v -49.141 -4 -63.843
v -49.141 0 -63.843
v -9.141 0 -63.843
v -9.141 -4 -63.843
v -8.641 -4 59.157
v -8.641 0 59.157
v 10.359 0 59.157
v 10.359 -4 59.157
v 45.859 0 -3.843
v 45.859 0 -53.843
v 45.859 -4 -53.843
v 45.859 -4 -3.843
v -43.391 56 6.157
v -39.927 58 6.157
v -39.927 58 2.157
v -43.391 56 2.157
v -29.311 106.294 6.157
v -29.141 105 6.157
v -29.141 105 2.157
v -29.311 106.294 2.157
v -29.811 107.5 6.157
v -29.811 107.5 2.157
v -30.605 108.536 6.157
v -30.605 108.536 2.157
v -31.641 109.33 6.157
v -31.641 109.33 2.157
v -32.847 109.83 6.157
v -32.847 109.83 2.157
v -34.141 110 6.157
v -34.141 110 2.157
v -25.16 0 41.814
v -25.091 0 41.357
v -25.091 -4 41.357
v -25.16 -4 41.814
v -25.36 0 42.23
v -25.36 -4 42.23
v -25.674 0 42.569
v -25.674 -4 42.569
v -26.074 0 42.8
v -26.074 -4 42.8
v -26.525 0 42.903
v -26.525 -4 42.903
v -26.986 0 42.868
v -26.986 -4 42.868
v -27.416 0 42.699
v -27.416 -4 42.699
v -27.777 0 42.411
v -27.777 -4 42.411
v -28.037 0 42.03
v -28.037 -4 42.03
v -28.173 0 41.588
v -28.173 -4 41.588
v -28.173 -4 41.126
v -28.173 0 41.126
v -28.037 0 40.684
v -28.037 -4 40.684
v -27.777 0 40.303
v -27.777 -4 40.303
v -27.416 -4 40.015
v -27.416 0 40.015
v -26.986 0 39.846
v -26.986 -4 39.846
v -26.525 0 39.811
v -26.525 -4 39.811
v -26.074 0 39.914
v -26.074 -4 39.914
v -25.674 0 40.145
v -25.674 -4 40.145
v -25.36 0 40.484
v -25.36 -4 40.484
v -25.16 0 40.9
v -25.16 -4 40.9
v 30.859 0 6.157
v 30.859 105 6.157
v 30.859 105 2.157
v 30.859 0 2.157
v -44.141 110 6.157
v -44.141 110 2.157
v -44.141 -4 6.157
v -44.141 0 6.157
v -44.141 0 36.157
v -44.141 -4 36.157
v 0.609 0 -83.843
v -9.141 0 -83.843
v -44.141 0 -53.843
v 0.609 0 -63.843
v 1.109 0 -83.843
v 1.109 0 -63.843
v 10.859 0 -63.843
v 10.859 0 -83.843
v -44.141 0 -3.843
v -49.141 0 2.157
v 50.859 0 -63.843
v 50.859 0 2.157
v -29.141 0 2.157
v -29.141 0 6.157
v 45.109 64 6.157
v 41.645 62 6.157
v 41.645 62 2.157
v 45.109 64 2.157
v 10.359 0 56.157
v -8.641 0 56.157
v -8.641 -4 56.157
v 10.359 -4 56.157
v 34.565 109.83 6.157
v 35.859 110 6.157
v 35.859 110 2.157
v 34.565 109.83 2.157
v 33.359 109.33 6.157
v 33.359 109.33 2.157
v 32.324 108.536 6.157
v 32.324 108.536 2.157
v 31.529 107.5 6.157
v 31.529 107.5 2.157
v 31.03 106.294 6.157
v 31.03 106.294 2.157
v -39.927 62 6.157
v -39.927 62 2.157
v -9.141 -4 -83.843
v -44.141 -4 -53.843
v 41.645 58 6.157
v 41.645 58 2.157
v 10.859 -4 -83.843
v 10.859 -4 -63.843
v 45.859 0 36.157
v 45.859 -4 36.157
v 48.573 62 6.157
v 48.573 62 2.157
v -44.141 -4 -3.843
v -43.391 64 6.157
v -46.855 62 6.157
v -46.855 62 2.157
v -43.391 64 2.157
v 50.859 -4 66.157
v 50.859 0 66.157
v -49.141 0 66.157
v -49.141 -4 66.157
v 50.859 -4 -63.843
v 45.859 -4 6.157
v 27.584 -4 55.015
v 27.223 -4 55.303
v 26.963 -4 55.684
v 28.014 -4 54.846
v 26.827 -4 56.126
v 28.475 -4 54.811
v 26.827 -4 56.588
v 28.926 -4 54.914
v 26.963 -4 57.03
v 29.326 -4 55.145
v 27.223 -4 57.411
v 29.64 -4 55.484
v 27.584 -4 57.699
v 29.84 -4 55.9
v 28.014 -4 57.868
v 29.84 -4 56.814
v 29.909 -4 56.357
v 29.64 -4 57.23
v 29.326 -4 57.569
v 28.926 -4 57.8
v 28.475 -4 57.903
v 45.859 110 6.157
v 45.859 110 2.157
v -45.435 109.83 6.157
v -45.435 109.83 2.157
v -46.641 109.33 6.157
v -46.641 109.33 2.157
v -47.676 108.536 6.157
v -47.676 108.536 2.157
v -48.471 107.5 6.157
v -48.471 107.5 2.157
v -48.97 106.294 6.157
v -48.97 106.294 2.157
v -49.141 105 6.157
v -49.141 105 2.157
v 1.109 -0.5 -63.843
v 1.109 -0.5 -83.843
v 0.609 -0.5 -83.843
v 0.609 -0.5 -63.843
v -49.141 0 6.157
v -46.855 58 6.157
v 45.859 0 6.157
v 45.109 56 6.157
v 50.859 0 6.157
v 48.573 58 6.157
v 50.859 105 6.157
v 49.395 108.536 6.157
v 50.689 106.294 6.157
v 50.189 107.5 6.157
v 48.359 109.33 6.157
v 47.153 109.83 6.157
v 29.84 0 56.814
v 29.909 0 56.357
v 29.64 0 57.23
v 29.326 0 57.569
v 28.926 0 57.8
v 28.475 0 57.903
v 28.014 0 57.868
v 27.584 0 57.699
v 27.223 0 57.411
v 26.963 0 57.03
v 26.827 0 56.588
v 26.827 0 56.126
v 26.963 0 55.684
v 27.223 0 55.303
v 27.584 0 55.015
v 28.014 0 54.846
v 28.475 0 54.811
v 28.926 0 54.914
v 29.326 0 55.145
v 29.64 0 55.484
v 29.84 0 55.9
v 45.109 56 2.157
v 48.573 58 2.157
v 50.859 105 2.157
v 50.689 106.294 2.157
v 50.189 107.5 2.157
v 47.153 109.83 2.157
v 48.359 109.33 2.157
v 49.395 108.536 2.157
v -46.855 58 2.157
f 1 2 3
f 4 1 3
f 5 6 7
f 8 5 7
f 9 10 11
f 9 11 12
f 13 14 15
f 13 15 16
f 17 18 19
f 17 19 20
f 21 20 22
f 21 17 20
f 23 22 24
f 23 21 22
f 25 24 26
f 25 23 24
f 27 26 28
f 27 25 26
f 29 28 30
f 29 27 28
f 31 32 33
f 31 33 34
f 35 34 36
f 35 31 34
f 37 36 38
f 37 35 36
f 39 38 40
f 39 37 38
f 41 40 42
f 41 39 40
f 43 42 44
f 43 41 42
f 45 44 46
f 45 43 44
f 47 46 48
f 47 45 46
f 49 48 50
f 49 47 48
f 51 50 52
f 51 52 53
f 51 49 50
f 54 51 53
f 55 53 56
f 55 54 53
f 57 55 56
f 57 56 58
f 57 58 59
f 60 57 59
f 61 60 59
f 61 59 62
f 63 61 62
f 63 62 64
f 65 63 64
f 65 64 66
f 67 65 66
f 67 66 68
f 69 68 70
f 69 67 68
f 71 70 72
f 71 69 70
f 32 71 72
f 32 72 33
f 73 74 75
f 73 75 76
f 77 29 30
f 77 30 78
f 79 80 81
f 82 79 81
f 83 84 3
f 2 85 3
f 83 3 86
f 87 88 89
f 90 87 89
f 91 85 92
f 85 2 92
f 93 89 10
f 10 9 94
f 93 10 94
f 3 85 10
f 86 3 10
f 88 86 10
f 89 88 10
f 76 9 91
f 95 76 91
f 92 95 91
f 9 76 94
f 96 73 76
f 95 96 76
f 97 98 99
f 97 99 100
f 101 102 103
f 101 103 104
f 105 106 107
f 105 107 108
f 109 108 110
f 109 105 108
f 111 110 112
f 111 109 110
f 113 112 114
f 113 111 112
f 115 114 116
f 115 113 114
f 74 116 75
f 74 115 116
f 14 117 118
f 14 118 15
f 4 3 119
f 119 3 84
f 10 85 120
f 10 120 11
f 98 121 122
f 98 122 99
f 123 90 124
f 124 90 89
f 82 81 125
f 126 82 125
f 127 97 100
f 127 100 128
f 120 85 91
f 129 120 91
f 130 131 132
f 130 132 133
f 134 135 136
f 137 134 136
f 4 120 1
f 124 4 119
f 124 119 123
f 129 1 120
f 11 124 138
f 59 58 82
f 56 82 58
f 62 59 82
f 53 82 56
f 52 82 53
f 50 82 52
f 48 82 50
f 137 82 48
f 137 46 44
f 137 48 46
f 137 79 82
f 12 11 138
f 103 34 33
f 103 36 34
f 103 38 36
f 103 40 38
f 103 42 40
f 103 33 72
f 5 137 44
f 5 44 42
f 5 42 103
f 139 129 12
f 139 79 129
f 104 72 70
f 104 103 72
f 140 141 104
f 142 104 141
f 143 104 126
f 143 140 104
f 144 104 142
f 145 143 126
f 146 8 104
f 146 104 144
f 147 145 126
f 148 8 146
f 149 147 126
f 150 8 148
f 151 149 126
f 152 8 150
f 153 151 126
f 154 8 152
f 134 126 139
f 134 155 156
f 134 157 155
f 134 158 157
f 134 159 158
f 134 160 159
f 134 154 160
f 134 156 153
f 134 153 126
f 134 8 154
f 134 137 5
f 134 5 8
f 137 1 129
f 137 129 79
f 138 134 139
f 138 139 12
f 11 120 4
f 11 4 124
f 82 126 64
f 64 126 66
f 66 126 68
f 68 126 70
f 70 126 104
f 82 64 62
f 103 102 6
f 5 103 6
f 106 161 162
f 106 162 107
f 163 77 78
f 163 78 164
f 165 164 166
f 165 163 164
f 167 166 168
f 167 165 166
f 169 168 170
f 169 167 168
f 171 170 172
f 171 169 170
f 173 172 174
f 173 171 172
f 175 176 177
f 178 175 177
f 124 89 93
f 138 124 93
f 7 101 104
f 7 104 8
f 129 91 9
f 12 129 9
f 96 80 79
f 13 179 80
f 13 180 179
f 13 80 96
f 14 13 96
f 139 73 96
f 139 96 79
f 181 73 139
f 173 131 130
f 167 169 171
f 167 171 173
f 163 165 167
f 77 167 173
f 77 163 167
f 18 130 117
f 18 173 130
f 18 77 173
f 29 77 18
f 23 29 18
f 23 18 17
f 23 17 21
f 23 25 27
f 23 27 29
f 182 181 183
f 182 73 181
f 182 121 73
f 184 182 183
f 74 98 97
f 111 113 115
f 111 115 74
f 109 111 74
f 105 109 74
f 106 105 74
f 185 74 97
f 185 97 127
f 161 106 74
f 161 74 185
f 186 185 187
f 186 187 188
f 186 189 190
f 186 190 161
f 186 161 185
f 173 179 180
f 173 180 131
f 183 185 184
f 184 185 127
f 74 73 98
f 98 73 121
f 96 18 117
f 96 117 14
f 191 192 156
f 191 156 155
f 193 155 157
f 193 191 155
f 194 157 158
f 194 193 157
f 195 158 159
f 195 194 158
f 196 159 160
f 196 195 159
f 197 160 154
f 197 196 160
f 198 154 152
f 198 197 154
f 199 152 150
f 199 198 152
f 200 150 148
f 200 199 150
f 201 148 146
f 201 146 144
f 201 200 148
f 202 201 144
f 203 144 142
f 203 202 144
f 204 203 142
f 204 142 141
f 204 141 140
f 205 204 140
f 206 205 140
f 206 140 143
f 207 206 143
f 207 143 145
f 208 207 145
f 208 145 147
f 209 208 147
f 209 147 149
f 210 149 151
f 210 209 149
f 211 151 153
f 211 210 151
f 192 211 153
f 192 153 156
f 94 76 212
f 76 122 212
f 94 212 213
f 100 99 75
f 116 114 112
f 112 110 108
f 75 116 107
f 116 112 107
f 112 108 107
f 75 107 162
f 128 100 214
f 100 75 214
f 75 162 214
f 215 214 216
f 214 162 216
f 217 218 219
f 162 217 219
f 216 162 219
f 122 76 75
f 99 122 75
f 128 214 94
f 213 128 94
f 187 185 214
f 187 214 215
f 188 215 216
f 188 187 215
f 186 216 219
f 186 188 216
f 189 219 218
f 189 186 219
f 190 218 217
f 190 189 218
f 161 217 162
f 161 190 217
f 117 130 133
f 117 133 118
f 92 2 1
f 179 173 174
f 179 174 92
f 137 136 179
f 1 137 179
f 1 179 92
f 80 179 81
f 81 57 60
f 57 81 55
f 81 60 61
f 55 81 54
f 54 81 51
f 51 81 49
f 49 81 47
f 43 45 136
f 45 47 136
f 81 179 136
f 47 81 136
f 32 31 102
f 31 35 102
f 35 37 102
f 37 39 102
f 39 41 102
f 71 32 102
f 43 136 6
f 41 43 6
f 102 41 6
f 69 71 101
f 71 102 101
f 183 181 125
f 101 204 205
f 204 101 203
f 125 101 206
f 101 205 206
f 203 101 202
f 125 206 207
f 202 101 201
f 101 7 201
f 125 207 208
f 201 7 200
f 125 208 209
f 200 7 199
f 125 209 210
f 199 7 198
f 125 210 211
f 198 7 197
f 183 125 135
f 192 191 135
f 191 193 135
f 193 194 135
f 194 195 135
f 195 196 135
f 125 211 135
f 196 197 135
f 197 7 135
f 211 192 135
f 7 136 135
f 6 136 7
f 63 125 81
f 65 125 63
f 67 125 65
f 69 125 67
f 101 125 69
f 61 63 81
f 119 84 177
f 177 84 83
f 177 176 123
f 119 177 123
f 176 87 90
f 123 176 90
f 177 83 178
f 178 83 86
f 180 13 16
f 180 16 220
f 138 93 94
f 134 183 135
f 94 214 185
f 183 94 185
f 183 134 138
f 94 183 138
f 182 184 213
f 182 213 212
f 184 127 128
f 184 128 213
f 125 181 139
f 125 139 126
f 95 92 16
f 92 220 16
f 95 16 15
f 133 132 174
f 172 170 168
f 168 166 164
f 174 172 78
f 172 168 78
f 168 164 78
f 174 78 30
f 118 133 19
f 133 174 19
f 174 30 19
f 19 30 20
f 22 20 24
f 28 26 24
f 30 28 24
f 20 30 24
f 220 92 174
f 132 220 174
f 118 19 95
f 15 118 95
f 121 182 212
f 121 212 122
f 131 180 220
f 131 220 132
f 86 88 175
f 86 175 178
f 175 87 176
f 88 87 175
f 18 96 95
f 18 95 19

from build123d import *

# Parameters (mm, degrees)
F0_W     = 90
F0_H     = 50
F0_H_2   = 30
F0_R     = 1.55
F0_W_2   = 19
F0_H_3   = 3
F1_DEPTH = 4
F3_DEPTH = 4
F4_W     = 0.5
F4_H     = 20
F5_DEPTH = 0.5


with BuildPart() as f1:
    # F0 (on Front) → F1 (new body)
    with BuildSketch(Plane.XZ):
        Polygon((50.859297, 66.157015), (-49.140703, 66.157015), (-49.140703, -63.842985), (-9.140703, -63.842985), (-9.140703, -83.842985), (10.859297, -83.842985), (10.859297, -63.842985), (50.859297, -63.842985), align=None)
        with Locations((0.859297, -28.842985)):
            Rectangle(F0_W, F0_H, mode=Mode.SUBTRACT)
        with Locations((0.859297, 21.157015)):
            Rectangle(F0_W, F0_H_2, mode=Mode.SUBTRACT)
        with Locations((-26.640703, 41.357015)):
            Circle(F0_R, mode=Mode.SUBTRACT)
        with Locations((0.859297, 57.657015)):
            Rectangle(F0_W_2, F0_H_3, mode=Mode.SUBTRACT)
        with Locations((28.359297, 56.357015)):
            Circle(F0_R, mode=Mode.SUBTRACT)
    extrude(amount=F1_DEPTH)

    # F2 (on face) → F3 (join)
    with BuildSketch(Plane.XY.offset(6.157015)):
        with BuildLine():
            Line((-49.140703, 105), (-49.140703, 0))
            Line((-49.140703, 0), (-29.140703, 0))
            Line((-29.140703, 0), (-29.140703, 105))
            ThreePointArc((-29.140703, 105), (-30.605169, 108.535534), (-34.140703, 110))
            Line((-34.140703, 110), (-44.140703, 110))
            ThreePointArc((-44.140703, 110), (-47.676237, 108.535534), (-49.140703, 105))
        make_face()
        Polygon((-46.854805, 62), (-43.390703, 64), (-39.926602, 62), (-39.926602, 58), (-43.390703, 56), (-46.854805, 58), align=None, mode=Mode.SUBTRACT)
        with BuildLine():
            Line((30.859297, 105), (30.859297, 0))
            Line((30.859297, 0), (50.859297, 0))
            Line((50.859297, 0), (50.859297, 105))
            ThreePointArc((50.859297, 105), (49.394831, 108.535534), (45.859297, 110))
            Line((45.859297, 110), (35.859297, 110))
            ThreePointArc((35.859297, 110), (32.323763, 108.535534), (30.859297, 105))
        make_face()
        Polygon((45.109297, 64), (48.573398, 62), (48.573398, 58), (45.109297, 56), (41.645195, 58), (41.645195, 62), align=None, mode=Mode.SUBTRACT)
    extrude(amount=-F3_DEPTH)

    # F4 (on face) → F5 (cut)
    with BuildSketch(Plane(origin=(0, 0, 0), x_dir=(-1, 0, 0), z_dir=(0, 1, 0))):
        with Locations((-0.859297, -73.842985)):
            Rectangle(F4_W, F4_H)
    extrude(amount=-F5_DEPTH, mode=Mode.SUBTRACT)


solid = f1.part
